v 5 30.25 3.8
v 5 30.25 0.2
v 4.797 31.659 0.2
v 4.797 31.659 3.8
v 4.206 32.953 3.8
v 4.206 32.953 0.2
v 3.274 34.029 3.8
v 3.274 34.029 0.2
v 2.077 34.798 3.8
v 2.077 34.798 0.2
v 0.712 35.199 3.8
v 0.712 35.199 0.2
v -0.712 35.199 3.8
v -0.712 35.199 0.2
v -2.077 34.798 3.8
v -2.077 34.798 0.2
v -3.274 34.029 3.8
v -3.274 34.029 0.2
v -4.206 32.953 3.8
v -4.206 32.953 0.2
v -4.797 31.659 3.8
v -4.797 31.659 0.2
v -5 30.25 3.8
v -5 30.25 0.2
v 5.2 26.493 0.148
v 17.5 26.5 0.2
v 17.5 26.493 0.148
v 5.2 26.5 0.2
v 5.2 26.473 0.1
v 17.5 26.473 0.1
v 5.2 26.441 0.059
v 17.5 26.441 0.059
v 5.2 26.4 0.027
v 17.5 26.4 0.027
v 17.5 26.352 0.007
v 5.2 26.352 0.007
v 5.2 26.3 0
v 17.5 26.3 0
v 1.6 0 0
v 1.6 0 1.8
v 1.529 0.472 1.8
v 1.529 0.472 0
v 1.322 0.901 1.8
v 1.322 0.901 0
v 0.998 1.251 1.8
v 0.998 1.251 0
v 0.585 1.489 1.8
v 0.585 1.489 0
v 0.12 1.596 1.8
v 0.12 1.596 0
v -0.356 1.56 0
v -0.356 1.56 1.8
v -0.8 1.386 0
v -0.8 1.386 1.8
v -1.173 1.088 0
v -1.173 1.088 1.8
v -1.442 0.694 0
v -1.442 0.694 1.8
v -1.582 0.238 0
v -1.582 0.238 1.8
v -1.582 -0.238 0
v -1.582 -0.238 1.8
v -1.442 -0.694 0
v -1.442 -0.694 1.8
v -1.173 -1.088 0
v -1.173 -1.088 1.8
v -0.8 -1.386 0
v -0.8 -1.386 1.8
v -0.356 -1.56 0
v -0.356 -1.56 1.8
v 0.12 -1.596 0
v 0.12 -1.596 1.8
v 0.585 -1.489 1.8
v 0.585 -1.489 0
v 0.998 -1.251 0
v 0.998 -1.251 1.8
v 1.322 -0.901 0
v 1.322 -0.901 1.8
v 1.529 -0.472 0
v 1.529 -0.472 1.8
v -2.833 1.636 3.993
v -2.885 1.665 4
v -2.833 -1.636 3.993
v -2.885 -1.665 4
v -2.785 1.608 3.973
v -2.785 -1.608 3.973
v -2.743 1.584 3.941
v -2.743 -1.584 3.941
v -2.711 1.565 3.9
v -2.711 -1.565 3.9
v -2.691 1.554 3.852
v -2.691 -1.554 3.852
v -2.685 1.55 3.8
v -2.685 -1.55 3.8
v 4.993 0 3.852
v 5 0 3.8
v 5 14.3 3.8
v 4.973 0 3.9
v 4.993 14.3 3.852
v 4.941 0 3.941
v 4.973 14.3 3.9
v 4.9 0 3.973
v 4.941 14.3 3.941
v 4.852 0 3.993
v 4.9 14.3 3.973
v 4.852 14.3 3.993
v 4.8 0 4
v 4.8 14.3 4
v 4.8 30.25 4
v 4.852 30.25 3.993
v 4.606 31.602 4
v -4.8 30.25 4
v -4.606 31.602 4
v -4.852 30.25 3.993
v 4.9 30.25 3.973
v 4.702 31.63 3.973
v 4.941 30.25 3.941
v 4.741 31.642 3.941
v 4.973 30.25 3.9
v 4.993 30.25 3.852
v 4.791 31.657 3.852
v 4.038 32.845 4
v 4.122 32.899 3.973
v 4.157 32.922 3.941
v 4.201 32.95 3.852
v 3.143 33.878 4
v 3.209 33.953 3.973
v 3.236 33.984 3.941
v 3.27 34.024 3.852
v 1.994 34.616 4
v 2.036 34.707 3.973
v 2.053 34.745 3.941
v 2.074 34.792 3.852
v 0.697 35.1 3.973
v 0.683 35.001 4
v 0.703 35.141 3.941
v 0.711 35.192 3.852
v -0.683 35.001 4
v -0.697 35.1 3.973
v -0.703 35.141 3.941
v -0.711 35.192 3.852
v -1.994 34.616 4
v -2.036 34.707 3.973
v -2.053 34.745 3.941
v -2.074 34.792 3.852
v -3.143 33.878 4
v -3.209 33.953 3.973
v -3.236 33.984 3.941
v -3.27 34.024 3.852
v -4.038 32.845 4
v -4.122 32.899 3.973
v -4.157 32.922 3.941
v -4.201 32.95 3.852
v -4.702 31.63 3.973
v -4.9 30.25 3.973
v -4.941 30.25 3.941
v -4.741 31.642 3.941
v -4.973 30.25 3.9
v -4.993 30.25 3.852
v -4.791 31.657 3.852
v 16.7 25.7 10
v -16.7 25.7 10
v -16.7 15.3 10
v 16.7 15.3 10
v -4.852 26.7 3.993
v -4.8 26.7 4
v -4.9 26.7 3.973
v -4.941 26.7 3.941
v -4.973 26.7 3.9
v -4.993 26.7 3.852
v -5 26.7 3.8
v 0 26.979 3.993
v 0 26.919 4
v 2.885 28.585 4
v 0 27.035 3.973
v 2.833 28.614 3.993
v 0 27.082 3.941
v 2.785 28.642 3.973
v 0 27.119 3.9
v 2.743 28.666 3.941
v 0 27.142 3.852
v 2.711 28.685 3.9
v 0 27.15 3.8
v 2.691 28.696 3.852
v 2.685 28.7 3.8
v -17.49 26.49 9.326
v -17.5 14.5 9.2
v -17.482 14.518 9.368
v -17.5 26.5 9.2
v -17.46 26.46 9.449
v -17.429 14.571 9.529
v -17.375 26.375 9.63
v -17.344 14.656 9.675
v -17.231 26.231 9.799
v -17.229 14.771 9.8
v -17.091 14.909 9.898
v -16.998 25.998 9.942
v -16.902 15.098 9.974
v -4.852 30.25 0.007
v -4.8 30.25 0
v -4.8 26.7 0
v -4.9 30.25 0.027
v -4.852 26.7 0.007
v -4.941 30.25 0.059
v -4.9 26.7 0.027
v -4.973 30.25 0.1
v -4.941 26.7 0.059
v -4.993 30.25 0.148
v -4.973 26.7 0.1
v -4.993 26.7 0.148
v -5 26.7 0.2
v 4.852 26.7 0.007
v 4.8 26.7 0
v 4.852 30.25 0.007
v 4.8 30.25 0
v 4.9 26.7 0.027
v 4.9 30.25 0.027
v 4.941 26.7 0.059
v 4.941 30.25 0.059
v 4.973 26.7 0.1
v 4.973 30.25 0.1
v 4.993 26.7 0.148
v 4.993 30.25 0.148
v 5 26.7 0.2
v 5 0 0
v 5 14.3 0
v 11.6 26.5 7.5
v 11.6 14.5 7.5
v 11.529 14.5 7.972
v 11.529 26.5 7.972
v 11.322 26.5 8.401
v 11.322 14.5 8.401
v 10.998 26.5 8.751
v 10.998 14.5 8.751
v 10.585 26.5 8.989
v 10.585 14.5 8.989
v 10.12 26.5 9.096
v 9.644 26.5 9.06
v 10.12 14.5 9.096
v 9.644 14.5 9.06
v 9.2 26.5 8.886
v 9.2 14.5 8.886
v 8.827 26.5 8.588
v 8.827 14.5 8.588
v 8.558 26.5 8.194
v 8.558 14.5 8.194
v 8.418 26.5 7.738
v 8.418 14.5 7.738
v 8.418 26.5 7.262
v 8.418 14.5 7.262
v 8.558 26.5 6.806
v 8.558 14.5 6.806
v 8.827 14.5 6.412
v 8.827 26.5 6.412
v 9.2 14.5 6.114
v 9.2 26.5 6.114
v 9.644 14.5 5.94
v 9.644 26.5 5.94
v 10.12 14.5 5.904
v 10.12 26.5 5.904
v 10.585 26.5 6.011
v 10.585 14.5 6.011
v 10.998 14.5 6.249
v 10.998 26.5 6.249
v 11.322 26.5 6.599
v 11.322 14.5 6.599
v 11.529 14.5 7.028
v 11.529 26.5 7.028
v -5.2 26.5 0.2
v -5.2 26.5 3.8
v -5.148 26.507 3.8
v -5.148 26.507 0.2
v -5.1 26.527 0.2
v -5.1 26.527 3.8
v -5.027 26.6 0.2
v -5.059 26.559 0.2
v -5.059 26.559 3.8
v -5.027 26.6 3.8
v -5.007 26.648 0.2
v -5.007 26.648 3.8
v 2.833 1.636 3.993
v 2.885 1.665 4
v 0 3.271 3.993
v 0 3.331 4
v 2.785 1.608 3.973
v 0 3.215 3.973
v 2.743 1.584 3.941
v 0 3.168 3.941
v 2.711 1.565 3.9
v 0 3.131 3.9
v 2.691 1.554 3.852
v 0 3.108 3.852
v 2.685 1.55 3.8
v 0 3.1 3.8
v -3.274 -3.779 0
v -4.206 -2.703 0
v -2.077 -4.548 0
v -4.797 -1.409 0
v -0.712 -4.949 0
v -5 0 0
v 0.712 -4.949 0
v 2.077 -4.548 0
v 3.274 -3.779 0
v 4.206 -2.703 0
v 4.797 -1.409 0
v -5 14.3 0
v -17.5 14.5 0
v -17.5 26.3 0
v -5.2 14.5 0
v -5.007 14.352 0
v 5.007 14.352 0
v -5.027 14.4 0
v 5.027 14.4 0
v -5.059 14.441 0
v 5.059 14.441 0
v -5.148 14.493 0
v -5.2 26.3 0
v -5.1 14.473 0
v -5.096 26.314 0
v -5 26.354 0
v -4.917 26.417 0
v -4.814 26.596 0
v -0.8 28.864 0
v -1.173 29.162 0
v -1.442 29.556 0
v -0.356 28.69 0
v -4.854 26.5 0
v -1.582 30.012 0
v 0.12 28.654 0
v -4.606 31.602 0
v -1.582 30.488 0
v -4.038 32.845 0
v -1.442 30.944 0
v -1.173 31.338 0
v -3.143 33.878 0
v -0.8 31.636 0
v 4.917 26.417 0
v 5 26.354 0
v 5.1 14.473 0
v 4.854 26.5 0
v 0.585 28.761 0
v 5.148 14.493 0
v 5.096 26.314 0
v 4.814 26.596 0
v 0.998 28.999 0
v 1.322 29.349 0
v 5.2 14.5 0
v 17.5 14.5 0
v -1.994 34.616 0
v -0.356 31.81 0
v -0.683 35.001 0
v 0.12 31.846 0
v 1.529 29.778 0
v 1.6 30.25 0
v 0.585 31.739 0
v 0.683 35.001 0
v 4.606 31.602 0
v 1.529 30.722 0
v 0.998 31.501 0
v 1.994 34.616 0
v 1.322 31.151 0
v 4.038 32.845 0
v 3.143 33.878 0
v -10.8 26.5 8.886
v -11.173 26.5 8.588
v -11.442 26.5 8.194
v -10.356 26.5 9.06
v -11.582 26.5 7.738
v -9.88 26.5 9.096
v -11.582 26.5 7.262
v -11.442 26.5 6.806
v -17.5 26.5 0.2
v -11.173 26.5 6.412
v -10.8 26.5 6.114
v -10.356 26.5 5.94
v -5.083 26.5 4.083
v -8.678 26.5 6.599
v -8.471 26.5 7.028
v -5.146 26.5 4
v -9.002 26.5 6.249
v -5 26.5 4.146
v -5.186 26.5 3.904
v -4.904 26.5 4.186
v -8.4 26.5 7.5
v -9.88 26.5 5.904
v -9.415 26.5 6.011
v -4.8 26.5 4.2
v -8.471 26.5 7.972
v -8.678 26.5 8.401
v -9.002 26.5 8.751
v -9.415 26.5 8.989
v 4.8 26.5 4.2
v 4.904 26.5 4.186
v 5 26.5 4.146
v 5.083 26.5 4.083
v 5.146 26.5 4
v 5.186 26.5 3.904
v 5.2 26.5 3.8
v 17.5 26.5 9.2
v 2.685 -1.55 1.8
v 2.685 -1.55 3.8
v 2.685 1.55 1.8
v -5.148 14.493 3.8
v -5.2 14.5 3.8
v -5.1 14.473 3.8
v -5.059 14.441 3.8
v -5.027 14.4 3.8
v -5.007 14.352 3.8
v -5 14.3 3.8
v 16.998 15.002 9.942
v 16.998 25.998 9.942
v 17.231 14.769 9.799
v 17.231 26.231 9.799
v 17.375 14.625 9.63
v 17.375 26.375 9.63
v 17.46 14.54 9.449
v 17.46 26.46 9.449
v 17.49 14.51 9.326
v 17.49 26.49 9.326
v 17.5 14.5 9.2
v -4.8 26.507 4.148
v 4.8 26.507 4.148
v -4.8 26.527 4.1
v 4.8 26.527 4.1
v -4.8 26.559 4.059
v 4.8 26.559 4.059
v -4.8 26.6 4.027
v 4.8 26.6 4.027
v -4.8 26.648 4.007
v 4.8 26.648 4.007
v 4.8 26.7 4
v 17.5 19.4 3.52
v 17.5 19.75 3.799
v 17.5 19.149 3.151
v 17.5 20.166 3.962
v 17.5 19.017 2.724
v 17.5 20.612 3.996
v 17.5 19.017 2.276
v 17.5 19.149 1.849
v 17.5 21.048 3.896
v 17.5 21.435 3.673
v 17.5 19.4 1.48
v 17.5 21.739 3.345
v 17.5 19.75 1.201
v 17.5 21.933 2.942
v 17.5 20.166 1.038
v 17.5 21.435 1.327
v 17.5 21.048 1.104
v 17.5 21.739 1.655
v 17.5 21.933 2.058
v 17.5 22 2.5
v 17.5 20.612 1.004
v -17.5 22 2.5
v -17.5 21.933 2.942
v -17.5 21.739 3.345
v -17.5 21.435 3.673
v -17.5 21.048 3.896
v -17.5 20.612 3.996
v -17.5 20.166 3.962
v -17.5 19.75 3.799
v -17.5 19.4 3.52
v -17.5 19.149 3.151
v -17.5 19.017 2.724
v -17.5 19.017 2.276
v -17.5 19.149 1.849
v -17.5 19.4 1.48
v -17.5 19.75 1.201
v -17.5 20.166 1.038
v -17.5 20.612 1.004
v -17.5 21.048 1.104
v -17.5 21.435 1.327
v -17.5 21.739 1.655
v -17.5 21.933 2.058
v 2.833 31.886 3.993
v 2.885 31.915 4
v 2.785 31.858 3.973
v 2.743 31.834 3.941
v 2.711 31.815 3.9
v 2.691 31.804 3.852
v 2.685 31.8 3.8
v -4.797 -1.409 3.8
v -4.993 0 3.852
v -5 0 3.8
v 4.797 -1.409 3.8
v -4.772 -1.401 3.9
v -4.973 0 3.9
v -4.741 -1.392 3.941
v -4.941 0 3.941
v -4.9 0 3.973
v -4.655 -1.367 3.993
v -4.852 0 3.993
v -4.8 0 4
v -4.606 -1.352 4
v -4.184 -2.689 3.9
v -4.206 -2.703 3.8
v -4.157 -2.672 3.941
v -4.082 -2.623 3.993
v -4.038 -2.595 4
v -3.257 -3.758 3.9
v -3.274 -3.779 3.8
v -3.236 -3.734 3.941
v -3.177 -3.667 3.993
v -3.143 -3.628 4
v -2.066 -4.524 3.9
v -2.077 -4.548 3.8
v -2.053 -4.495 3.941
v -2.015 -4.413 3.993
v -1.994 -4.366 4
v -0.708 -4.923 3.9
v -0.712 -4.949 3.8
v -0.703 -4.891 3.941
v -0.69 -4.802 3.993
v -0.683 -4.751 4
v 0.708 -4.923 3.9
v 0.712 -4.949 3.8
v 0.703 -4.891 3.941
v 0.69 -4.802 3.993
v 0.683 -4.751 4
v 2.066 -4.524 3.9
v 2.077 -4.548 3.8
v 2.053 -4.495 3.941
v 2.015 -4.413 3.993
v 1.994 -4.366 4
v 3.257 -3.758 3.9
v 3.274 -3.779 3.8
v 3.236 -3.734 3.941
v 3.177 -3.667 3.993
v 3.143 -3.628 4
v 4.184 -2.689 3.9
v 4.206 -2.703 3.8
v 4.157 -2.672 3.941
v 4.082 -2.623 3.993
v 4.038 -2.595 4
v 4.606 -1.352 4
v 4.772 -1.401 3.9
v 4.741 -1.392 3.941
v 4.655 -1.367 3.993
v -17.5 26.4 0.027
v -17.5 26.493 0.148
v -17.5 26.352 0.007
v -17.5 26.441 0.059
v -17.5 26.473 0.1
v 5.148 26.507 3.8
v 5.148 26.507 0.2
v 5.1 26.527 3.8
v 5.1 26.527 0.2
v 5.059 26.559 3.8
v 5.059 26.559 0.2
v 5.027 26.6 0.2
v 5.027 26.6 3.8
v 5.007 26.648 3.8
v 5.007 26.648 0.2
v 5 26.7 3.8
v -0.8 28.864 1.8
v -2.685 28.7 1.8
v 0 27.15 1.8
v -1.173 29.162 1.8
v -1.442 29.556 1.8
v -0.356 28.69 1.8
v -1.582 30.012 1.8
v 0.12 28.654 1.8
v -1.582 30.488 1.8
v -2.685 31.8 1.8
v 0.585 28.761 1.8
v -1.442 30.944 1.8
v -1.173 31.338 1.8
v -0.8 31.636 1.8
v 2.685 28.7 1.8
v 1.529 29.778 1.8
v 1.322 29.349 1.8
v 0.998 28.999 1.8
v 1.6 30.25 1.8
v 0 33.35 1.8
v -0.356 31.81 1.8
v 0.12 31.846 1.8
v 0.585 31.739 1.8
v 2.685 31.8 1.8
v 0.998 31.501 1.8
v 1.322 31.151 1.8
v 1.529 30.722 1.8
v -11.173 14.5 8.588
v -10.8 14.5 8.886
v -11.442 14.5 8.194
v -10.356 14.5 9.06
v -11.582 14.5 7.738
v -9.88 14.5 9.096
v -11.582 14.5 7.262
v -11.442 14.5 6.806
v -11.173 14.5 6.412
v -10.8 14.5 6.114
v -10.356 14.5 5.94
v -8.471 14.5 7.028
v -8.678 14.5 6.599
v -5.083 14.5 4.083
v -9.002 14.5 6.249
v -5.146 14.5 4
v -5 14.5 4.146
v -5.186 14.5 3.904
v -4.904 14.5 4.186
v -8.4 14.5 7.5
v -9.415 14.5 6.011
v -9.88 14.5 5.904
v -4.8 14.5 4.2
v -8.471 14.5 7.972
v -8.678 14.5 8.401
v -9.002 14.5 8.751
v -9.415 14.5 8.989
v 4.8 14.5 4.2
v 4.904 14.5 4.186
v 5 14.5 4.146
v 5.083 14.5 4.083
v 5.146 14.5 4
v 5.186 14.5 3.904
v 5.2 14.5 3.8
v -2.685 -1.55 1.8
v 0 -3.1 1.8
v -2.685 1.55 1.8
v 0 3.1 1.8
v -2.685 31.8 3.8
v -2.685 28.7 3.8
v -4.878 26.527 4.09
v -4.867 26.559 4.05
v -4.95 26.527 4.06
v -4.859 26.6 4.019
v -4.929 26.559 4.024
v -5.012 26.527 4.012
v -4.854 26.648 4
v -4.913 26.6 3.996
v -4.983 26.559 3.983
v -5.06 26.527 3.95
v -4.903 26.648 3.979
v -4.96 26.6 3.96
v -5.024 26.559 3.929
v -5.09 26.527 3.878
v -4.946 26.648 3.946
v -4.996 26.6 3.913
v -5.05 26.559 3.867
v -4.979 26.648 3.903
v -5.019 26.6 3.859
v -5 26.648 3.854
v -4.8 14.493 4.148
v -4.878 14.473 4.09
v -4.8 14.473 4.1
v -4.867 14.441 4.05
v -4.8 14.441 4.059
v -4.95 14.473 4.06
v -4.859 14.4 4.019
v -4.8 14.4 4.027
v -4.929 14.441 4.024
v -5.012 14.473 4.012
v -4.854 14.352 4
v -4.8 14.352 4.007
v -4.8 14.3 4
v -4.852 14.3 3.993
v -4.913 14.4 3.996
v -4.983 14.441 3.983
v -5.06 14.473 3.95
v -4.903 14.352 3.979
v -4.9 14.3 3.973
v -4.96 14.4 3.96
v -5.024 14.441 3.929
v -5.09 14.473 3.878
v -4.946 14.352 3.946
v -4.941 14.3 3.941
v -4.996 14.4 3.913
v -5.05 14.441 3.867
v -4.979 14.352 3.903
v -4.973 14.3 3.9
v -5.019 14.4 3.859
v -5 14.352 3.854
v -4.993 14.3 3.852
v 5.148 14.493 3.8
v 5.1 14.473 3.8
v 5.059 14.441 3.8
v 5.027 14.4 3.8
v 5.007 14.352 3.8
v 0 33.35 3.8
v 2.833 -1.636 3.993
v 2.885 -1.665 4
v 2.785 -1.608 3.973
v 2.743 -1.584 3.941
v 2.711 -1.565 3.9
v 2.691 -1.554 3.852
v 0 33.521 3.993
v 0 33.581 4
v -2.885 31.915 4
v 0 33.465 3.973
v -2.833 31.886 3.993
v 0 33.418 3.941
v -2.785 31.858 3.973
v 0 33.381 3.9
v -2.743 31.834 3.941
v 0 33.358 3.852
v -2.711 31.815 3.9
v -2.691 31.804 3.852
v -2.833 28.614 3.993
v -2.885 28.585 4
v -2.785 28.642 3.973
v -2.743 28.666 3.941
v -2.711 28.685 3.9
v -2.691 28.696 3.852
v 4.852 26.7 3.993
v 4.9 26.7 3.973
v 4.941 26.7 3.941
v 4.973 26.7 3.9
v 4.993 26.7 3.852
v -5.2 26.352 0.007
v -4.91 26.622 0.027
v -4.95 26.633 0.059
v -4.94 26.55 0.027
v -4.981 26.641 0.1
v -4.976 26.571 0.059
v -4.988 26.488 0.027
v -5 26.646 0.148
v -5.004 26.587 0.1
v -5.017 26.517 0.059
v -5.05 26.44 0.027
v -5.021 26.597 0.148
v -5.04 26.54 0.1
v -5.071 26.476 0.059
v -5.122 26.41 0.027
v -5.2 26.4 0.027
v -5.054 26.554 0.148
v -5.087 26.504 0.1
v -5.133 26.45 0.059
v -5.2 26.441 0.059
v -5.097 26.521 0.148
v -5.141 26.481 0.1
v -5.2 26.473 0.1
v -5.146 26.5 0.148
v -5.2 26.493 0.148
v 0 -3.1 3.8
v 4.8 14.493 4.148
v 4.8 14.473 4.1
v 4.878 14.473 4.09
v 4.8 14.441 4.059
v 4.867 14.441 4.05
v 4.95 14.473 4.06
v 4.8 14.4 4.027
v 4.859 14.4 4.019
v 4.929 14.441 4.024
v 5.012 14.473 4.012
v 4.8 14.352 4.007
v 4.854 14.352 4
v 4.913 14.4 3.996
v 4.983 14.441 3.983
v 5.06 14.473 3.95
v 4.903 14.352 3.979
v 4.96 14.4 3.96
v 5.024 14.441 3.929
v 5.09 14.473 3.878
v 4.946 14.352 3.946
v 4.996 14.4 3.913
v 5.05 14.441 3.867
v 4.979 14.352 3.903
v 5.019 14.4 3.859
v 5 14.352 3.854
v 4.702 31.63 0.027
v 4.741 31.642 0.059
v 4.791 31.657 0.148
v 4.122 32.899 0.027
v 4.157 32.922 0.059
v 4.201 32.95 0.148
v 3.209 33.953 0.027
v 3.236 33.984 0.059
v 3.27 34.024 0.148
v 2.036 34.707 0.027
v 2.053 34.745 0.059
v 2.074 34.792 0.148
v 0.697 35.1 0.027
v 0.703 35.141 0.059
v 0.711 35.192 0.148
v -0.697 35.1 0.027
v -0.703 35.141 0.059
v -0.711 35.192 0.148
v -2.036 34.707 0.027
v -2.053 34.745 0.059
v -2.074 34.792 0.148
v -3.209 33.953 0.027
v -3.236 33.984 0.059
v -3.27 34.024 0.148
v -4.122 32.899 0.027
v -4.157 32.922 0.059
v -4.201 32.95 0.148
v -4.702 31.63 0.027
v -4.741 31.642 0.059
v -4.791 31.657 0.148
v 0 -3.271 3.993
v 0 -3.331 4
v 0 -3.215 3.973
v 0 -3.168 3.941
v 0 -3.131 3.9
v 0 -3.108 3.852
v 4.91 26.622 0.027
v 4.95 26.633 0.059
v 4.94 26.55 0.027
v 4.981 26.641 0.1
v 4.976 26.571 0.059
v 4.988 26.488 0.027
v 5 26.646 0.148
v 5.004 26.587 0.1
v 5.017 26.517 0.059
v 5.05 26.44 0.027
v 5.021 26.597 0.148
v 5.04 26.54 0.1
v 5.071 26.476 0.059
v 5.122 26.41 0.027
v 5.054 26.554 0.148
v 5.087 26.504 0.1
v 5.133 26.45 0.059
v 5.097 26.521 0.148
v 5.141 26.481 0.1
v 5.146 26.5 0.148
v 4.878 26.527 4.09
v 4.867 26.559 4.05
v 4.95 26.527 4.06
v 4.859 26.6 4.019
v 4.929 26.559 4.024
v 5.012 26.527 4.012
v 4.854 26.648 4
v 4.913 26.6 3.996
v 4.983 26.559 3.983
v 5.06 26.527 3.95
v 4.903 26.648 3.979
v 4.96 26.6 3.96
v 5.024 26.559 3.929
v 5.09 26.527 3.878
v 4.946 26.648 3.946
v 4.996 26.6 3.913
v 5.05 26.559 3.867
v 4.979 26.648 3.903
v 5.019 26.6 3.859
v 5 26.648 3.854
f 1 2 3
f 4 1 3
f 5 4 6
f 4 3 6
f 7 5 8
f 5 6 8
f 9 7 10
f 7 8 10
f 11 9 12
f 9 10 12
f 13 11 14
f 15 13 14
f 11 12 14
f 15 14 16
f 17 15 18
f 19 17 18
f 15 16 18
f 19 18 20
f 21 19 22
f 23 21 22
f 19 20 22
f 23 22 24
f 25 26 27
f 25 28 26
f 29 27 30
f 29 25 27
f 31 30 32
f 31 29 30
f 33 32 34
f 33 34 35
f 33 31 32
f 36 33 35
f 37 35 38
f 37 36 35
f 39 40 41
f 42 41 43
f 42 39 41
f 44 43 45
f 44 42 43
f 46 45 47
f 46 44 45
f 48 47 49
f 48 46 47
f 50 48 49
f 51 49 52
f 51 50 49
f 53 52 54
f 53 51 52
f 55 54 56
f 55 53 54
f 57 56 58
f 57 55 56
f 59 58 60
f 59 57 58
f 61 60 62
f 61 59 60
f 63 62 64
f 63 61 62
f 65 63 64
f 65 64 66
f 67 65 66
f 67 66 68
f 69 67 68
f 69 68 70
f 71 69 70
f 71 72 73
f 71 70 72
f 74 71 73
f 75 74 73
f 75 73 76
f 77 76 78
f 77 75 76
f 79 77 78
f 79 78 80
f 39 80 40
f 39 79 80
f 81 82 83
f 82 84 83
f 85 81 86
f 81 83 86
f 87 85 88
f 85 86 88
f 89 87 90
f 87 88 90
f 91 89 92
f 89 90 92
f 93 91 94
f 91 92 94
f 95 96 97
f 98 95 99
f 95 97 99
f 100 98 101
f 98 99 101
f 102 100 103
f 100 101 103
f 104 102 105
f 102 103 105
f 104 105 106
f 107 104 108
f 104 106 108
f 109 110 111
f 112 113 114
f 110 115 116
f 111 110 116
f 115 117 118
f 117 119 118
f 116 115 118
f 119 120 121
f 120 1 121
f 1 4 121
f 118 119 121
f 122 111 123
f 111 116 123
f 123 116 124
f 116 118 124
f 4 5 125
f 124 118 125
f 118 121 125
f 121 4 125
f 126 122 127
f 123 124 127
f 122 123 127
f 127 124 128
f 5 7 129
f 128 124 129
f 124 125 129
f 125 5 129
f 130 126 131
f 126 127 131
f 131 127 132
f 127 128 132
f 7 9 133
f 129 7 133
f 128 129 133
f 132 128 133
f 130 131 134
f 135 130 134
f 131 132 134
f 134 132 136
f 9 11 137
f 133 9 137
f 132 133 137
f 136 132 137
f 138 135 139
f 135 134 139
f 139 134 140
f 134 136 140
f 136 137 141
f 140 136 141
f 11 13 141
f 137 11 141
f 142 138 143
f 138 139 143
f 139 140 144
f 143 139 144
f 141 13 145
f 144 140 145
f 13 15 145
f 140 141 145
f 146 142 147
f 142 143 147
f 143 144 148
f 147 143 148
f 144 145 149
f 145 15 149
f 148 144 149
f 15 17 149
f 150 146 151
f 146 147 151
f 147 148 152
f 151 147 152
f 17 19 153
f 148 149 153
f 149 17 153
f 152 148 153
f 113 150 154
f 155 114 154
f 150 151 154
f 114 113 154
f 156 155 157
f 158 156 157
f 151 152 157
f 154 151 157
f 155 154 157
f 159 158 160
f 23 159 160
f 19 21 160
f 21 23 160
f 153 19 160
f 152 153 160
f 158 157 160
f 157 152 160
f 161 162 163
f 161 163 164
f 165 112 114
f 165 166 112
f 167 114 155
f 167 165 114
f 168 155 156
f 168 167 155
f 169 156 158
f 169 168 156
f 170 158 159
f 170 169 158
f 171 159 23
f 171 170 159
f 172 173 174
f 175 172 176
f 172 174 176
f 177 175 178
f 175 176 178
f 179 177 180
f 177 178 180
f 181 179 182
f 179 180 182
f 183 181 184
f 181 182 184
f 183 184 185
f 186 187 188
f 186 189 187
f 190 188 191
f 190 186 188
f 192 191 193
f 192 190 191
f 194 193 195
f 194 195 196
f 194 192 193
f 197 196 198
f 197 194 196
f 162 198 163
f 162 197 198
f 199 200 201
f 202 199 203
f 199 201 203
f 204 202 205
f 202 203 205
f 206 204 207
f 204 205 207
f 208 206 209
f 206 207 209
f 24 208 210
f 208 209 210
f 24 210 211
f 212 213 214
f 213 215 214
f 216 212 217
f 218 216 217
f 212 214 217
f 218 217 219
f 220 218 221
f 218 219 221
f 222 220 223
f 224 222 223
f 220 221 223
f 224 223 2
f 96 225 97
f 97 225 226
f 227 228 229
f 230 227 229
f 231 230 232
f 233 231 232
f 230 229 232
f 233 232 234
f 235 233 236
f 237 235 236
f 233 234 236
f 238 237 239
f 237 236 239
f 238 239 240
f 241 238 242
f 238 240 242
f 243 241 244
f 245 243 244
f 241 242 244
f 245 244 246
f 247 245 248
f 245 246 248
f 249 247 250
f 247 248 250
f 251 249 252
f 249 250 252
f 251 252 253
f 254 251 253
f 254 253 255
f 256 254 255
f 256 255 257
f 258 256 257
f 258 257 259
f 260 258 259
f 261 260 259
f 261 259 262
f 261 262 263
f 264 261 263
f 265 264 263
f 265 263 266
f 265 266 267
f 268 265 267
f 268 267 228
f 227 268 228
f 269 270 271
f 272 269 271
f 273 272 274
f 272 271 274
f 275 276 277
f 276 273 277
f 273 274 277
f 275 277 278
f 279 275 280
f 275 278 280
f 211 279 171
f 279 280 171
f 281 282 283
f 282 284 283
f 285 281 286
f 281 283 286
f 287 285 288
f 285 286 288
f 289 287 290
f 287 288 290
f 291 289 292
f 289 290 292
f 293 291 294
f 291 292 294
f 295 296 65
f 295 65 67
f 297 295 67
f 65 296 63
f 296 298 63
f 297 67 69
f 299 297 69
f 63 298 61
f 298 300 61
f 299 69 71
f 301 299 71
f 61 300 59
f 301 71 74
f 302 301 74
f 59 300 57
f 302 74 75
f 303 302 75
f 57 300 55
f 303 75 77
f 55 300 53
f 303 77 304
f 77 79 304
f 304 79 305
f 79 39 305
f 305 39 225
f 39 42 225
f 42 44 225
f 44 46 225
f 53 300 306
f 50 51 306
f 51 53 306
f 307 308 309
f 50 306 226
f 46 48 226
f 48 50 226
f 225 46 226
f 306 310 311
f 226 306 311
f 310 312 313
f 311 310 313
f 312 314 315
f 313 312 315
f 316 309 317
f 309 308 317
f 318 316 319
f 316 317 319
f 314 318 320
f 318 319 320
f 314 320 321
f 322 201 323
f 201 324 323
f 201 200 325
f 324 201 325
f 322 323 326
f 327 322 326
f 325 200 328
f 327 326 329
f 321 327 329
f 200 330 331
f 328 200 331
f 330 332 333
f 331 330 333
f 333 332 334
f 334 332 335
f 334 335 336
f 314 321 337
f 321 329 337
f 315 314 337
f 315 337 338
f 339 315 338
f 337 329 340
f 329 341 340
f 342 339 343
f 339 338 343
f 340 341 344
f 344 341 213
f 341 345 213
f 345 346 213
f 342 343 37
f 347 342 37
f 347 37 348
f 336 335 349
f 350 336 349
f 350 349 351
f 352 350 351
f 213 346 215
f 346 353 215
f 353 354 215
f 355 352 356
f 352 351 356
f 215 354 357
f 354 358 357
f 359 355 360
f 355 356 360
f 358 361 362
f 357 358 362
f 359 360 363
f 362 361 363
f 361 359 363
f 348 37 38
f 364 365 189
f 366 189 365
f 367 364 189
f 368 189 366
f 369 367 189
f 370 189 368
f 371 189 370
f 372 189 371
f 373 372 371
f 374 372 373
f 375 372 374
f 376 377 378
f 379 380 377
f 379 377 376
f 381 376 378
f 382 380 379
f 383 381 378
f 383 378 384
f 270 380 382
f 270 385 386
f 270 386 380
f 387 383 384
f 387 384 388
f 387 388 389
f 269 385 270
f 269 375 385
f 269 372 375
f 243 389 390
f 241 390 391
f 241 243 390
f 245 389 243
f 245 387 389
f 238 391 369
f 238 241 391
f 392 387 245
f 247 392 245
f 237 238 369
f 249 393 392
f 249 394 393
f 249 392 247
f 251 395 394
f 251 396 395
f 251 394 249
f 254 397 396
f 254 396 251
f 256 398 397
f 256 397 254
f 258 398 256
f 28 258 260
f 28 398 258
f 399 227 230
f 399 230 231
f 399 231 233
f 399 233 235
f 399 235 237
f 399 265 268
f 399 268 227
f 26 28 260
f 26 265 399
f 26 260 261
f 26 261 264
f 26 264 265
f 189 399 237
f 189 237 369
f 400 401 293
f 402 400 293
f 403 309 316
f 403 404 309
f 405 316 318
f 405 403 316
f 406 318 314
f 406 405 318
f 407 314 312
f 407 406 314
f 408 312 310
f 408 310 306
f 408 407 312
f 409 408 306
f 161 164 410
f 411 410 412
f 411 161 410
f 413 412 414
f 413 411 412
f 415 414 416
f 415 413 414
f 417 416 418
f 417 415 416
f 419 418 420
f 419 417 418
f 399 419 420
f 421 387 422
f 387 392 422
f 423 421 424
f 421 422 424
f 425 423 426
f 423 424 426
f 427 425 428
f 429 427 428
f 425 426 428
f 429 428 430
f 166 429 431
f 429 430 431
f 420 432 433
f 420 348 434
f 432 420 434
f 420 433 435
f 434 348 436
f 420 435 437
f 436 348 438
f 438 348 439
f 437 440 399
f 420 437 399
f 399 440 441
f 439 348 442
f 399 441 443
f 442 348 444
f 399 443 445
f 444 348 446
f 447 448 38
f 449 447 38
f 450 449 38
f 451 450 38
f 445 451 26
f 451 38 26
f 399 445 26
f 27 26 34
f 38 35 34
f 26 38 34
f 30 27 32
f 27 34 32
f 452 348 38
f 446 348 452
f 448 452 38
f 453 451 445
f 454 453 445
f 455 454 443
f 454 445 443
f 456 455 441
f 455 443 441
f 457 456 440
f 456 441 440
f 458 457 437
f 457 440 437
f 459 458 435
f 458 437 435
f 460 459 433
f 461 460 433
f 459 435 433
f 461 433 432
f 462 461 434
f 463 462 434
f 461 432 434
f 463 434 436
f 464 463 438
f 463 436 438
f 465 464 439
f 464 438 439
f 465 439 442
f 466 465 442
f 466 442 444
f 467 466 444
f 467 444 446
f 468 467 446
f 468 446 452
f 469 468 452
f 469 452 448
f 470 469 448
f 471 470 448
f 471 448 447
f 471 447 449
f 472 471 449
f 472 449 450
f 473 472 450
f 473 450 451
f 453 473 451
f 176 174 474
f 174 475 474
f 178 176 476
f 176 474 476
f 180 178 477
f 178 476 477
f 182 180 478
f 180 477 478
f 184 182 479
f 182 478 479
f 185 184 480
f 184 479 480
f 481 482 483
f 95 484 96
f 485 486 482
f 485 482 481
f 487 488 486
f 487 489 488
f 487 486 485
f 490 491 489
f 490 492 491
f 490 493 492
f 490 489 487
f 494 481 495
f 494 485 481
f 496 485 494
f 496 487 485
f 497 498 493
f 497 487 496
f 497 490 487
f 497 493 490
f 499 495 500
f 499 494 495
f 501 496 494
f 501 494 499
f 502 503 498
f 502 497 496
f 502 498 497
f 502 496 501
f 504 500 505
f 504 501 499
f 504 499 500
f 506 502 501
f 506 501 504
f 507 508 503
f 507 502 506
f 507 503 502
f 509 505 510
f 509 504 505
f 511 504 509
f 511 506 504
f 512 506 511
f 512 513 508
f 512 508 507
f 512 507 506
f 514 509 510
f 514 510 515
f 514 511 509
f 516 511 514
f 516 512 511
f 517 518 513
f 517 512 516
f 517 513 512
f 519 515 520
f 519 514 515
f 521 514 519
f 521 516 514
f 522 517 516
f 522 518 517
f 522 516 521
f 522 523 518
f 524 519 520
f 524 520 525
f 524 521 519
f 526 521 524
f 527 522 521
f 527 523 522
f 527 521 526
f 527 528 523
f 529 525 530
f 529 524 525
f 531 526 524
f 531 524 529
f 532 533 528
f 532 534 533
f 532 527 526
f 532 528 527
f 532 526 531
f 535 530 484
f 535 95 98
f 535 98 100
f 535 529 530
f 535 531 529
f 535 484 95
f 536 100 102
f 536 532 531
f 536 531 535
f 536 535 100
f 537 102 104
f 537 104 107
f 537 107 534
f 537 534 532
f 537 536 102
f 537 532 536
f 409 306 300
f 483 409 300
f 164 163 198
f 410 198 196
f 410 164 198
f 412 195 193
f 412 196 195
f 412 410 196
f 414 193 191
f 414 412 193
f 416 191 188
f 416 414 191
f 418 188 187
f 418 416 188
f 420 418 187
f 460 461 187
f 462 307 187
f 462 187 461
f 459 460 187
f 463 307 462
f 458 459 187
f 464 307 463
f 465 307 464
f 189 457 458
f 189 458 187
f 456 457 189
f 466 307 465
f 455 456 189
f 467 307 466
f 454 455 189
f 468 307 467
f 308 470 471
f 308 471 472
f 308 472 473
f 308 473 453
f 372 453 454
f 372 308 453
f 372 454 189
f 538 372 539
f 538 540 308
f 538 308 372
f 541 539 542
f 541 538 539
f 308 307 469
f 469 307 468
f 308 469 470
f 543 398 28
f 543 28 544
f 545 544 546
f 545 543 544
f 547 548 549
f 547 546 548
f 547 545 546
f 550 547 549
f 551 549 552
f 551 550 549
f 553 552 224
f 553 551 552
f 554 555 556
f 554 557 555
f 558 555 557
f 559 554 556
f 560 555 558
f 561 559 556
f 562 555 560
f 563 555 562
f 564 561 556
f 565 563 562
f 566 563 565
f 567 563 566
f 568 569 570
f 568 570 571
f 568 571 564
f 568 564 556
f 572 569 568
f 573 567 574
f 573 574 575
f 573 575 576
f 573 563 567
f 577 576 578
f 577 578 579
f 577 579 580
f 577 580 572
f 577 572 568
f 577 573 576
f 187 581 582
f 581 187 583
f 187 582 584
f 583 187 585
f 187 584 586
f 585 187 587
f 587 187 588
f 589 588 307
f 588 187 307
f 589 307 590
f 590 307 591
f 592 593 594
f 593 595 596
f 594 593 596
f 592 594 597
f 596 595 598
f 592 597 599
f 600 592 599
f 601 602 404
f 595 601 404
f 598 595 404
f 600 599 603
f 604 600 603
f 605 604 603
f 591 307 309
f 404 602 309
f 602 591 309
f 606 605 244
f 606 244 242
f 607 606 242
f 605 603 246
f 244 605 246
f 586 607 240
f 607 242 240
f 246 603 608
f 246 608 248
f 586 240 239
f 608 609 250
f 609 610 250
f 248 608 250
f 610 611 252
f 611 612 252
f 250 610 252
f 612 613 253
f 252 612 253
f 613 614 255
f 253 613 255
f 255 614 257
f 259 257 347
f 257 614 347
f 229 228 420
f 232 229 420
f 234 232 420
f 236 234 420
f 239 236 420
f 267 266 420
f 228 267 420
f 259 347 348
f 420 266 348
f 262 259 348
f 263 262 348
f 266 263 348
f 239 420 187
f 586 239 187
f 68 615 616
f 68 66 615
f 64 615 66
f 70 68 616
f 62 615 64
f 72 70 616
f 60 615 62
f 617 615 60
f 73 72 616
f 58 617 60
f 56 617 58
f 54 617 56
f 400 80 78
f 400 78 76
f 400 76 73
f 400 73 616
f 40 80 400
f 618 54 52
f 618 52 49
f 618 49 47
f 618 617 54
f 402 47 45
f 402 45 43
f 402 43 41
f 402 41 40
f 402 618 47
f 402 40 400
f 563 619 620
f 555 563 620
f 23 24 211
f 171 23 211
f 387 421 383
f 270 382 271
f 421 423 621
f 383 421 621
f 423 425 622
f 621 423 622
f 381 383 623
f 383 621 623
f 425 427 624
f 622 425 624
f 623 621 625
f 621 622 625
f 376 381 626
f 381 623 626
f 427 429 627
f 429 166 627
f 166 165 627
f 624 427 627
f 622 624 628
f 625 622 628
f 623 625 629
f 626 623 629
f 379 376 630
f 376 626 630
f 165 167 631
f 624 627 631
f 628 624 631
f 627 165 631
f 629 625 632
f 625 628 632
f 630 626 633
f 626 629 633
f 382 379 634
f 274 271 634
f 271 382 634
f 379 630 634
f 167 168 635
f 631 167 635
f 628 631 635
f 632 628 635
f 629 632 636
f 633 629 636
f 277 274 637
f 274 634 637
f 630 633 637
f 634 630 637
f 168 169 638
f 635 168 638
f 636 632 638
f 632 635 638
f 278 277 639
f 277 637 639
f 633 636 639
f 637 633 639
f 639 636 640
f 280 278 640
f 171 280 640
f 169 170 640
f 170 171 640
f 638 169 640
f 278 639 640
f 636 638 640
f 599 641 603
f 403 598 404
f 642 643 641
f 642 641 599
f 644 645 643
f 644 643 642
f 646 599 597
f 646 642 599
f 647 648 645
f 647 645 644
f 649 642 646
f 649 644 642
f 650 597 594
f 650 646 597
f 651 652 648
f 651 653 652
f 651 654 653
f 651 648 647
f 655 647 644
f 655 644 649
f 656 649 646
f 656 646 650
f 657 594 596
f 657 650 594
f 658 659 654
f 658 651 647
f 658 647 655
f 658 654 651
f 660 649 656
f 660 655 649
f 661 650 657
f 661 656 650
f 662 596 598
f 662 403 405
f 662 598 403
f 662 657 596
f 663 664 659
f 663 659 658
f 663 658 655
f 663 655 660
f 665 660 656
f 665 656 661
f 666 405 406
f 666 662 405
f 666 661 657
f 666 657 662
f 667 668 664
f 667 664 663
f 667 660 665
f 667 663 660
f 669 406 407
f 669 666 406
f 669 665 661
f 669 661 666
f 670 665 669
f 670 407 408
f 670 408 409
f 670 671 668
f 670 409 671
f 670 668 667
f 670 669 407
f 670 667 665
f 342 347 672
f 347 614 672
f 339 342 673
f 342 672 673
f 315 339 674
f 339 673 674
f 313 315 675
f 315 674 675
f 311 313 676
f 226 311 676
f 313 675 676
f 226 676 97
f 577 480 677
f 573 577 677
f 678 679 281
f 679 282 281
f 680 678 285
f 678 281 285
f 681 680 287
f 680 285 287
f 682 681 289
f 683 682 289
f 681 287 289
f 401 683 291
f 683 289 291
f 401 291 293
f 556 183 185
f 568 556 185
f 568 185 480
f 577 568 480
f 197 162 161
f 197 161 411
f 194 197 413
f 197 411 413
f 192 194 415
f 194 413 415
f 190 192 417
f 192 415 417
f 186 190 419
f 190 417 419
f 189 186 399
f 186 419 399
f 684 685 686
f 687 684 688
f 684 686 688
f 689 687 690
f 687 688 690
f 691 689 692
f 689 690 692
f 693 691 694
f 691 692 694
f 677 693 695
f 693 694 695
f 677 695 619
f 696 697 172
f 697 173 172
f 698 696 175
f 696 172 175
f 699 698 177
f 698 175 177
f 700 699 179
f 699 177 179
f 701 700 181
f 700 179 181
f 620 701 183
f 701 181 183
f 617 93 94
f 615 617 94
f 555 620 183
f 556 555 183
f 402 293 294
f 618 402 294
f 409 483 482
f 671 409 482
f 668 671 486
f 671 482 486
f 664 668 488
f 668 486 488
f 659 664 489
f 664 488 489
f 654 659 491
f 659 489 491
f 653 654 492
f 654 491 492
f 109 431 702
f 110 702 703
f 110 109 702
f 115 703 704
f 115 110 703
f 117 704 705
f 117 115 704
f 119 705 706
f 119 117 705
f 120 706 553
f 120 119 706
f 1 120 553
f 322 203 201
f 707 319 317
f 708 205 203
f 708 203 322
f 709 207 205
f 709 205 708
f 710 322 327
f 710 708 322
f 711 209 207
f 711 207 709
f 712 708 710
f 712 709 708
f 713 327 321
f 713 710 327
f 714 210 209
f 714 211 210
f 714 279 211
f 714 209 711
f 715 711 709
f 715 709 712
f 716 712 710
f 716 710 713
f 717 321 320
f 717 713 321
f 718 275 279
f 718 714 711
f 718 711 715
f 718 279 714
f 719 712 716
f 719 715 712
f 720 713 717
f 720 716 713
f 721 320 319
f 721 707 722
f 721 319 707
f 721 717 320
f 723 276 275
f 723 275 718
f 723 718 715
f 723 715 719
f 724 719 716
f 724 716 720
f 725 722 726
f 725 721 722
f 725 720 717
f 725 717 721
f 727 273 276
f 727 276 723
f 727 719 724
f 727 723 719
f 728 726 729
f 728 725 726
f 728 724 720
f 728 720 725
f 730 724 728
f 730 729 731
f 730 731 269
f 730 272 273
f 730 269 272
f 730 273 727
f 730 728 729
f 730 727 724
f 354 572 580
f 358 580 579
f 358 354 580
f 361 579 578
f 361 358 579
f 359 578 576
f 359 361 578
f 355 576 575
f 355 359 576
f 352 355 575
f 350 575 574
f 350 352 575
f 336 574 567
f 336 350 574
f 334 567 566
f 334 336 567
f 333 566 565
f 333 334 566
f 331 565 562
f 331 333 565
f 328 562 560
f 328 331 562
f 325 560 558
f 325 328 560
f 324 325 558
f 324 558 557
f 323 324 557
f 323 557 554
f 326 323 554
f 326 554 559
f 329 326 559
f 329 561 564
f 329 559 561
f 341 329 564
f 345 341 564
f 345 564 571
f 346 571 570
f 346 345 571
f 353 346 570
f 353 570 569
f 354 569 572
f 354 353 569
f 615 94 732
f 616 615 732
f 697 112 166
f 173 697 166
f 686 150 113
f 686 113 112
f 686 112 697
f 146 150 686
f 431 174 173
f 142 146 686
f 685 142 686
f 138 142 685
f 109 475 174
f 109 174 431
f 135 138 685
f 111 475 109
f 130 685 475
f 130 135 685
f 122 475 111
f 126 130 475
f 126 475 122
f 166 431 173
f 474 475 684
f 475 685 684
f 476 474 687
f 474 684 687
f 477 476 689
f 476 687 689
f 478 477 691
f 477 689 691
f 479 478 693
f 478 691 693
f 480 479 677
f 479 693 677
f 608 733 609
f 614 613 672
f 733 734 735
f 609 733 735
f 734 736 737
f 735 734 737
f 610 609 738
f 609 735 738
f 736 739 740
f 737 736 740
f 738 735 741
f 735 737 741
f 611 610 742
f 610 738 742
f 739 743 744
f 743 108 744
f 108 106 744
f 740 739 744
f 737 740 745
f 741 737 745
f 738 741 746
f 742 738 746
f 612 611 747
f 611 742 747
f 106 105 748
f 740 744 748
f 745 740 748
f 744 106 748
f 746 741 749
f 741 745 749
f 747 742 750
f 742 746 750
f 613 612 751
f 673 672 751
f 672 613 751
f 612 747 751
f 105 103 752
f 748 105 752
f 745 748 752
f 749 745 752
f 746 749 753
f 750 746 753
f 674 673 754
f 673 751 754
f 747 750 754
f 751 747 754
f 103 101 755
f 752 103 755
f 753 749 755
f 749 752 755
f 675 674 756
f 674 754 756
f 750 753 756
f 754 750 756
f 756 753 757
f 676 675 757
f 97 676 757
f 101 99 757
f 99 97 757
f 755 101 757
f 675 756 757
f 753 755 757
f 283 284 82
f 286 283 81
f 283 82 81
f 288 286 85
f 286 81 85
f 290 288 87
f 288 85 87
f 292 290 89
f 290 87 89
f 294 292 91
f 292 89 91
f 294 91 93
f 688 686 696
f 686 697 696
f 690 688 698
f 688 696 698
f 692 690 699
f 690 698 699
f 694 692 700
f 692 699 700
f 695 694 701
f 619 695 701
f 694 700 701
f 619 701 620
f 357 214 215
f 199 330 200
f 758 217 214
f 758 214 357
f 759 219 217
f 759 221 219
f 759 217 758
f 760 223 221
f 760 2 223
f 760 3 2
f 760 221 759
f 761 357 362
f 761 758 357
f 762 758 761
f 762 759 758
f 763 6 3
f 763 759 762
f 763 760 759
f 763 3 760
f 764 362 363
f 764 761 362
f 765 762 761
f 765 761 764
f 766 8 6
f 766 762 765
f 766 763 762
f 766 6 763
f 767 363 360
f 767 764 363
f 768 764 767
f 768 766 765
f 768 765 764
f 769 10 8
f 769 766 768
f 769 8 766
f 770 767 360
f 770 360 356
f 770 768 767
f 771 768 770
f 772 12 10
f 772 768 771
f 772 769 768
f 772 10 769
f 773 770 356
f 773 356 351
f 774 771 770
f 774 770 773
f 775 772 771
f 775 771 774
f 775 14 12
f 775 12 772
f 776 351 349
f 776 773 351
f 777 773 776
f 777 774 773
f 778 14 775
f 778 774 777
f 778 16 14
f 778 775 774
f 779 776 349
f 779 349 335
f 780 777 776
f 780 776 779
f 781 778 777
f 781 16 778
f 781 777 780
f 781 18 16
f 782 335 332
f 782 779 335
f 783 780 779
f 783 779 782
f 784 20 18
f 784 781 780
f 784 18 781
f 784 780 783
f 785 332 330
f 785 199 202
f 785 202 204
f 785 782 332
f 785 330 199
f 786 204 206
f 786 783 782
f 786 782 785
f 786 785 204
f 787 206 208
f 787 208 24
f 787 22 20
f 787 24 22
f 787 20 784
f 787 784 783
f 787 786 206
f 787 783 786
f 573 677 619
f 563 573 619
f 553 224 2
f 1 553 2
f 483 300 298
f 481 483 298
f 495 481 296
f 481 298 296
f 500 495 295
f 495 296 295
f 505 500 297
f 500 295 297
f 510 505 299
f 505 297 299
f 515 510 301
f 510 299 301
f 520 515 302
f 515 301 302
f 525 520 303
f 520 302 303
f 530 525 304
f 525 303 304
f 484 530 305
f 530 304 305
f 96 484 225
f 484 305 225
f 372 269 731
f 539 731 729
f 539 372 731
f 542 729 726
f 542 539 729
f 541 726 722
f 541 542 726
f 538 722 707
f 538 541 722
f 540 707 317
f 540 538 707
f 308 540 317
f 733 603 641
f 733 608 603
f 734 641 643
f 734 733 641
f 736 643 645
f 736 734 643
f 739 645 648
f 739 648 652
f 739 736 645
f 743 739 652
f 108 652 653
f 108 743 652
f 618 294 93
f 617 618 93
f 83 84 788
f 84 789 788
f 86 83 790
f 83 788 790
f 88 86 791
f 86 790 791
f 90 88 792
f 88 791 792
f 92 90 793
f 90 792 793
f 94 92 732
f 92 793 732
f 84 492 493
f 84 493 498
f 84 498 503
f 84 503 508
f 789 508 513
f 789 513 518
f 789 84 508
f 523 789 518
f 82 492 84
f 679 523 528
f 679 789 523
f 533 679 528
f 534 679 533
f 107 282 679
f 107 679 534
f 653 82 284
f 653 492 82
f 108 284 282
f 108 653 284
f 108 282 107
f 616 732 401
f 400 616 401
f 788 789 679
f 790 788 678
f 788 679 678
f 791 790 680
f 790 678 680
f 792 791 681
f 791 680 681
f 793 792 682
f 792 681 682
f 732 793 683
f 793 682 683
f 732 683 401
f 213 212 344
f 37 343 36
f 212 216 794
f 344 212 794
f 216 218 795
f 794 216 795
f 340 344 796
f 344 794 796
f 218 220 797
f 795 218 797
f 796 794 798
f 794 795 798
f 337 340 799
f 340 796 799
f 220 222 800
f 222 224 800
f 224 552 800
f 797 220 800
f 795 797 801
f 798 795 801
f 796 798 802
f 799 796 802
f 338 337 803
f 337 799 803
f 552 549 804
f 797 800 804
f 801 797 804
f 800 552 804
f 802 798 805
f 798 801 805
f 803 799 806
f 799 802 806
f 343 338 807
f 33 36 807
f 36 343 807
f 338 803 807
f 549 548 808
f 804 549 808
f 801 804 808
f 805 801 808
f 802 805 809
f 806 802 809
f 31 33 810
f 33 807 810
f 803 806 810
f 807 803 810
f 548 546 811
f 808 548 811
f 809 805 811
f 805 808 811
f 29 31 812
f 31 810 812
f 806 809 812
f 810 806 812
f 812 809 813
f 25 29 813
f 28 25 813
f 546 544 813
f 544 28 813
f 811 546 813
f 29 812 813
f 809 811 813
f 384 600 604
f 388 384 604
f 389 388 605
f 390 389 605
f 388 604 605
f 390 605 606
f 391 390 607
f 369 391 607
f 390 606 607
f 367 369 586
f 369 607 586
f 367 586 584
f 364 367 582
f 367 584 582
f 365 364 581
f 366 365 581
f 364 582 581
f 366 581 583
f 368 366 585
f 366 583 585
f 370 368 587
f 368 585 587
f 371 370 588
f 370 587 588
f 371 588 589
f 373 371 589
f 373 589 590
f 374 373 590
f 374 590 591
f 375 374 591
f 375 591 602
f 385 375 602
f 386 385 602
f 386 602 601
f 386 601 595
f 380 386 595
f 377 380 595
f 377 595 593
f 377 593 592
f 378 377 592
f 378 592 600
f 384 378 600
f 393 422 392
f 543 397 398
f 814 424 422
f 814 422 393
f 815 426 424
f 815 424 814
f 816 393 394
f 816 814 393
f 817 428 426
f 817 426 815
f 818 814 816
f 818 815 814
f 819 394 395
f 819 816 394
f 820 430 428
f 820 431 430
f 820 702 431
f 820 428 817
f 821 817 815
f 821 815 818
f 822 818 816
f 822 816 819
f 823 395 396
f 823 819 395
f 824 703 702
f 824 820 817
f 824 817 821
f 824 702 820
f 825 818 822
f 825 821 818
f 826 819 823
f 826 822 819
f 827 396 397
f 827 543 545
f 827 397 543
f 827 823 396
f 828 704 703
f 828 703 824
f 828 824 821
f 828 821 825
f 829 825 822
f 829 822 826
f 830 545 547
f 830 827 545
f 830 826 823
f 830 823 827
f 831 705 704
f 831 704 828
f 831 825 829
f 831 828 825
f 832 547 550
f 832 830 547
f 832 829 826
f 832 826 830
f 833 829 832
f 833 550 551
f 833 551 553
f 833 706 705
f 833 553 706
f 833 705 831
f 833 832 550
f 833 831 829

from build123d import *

# Parameters (mm, degrees)
F0_R      = 1.6
F1_DEPTH  = 4
F2_W      = 35
F2_H      = 12
F3_DEPTH  = 6
F4_R      = 1.6
F5_DEPTH  = 20.751
F6_R      = 0.8
F7_R      = 1.5
F8_DEPTH  = 35.001
F10_DEPTH = 2.2
F11_R     = 0.2


with BuildPart() as f1:
    # F0 (on Top) → F1 (new body)
    with BuildSketch(Plane.XY):
        with BuildLine():
            ThreePointArc((5, 30.25), (0, 35.25), (-5, 30.25))
            Line((-5, 30.25), (-5, 26.5))
            Line((-5, 26.5), (-17.5, 26.5))
            Line((-17.5, 26.5), (-17.5, 14.5))
            Line((-17.5, 14.5), (-5, 14.5))
            Line((-5, 14.5), (-5, 0))
            ThreePointArc((-5, 0), (0, -5), (5, 0))
            Line((5, 0), (5, 14.5))
            Line((5, 14.5), (17.5, 14.5))
            Line((17.5, 14.5), (17.5, 26.5))
            Line((17.5, 26.5), (5, 26.5))
            Line((5, 26.5), (5, 30.25))
        make_face()
        Circle(F0_R, mode=Mode.SUBTRACT)
        with Locations((0, 30.25)):
            Circle(F0_R, mode=Mode.SUBTRACT)
    extrude(amount=F1_DEPTH)

    # F2 (on face) → F3 (join)
    with BuildSketch(Plane.XY.offset(4)):
        with Locations((0, 20.5)):
            Rectangle(F2_W, F2_H)
    extrude(amount=F3_DEPTH)

    # F4 (on face) → F5 (cut, through all)
    with BuildSketch(Plane.XZ.offset(-14.5)):
        with Locations((-10, 7.5)):
            Circle(F4_R)
        with Locations((10, 7.5)):
            Circle(F4_R)
    extrude(amount=-F5_DEPTH, mode=Mode.SUBTRACT)

    # F6
    f6_edges = [f1.edges().sort_by_distance(p)[0] for p in [
        (0, 26.5, 10),
        (-17.5, 20.5, 10),
        (0, 14.5, 10),
        (17.5, 20.5, 10),
    ]]
    fillet(f6_edges, radius=F6_R)

    # F7 (on face) → F8 (cut, through all)
    with BuildSketch(Plane.YZ.offset(17.5)):
        with Locations((20.5, 2.5)):
            Circle(F7_R)
    extrude(amount=-F8_DEPTH, mode=Mode.SUBTRACT)

    # F9 (on face) → F10 (cut)
    with BuildSketch(Plane.XY.offset(4)):
        Polygon((-2.6846787517, 28.7), (0, 27.15), (2.6846787517, 28.7), (2.6846787517, 31.8), (0, 33.35), (-2.6846787517, 31.8), align=None)
        Polygon((2.6846787517, 1.55), (0, 3.1), (-2.6846787517, 1.55), (-2.6846787517, -1.55), (0, -3.1), (2.6846787517, -1.55), align=None)
    extrude(amount=-F10_DEPTH, mode=Mode.SUBTRACT)

    # F11
    f11_edges = [f1.edges().sort_by_distance(p)[0] for p in [
        (5, 7.25, 4),
        (0, -5, 4),
        (0, 14.5, 4),
        (-5, 7.25, 4),
        (2.684679, 0, 4),
        (1.342339, 2.325, 4),
        (-1.342339, 2.325, 4),
        (-2.684679, 0, 4),
        (-1.342339, -2.325, 4),
        (1.342339, -2.325, 4),
        (5, 28.375, 4),
        (0, 26.5, 4),
        (0, 35.25, 4),
        (-5, 28.375, 4),
        (-1.342339, 27.925, 4),
        (1.342339, 27.925, 4),
        (2.684679, 30.25, 4),
        (1.342339, 32.575, 4),
        (-1.342339, 32.575, 4),
        (-2.684679, 30.25, 4),
        (-5, 30.25, 2),
        (-5, 26.5, 2),
        (-5, 28.375, 0),
        (11.25, 26.5, 0),
        (5, 26.5, 2),
        (-11.25, 26.5, 0),
        (0, 35.25, 0),
        (5, 28.375, 0),
        (-5, 14.5, 2),
        (5, 14.5, 2),
    ]]
    fillet(f11_edges, radius=F11_R)


solid = f1.part
